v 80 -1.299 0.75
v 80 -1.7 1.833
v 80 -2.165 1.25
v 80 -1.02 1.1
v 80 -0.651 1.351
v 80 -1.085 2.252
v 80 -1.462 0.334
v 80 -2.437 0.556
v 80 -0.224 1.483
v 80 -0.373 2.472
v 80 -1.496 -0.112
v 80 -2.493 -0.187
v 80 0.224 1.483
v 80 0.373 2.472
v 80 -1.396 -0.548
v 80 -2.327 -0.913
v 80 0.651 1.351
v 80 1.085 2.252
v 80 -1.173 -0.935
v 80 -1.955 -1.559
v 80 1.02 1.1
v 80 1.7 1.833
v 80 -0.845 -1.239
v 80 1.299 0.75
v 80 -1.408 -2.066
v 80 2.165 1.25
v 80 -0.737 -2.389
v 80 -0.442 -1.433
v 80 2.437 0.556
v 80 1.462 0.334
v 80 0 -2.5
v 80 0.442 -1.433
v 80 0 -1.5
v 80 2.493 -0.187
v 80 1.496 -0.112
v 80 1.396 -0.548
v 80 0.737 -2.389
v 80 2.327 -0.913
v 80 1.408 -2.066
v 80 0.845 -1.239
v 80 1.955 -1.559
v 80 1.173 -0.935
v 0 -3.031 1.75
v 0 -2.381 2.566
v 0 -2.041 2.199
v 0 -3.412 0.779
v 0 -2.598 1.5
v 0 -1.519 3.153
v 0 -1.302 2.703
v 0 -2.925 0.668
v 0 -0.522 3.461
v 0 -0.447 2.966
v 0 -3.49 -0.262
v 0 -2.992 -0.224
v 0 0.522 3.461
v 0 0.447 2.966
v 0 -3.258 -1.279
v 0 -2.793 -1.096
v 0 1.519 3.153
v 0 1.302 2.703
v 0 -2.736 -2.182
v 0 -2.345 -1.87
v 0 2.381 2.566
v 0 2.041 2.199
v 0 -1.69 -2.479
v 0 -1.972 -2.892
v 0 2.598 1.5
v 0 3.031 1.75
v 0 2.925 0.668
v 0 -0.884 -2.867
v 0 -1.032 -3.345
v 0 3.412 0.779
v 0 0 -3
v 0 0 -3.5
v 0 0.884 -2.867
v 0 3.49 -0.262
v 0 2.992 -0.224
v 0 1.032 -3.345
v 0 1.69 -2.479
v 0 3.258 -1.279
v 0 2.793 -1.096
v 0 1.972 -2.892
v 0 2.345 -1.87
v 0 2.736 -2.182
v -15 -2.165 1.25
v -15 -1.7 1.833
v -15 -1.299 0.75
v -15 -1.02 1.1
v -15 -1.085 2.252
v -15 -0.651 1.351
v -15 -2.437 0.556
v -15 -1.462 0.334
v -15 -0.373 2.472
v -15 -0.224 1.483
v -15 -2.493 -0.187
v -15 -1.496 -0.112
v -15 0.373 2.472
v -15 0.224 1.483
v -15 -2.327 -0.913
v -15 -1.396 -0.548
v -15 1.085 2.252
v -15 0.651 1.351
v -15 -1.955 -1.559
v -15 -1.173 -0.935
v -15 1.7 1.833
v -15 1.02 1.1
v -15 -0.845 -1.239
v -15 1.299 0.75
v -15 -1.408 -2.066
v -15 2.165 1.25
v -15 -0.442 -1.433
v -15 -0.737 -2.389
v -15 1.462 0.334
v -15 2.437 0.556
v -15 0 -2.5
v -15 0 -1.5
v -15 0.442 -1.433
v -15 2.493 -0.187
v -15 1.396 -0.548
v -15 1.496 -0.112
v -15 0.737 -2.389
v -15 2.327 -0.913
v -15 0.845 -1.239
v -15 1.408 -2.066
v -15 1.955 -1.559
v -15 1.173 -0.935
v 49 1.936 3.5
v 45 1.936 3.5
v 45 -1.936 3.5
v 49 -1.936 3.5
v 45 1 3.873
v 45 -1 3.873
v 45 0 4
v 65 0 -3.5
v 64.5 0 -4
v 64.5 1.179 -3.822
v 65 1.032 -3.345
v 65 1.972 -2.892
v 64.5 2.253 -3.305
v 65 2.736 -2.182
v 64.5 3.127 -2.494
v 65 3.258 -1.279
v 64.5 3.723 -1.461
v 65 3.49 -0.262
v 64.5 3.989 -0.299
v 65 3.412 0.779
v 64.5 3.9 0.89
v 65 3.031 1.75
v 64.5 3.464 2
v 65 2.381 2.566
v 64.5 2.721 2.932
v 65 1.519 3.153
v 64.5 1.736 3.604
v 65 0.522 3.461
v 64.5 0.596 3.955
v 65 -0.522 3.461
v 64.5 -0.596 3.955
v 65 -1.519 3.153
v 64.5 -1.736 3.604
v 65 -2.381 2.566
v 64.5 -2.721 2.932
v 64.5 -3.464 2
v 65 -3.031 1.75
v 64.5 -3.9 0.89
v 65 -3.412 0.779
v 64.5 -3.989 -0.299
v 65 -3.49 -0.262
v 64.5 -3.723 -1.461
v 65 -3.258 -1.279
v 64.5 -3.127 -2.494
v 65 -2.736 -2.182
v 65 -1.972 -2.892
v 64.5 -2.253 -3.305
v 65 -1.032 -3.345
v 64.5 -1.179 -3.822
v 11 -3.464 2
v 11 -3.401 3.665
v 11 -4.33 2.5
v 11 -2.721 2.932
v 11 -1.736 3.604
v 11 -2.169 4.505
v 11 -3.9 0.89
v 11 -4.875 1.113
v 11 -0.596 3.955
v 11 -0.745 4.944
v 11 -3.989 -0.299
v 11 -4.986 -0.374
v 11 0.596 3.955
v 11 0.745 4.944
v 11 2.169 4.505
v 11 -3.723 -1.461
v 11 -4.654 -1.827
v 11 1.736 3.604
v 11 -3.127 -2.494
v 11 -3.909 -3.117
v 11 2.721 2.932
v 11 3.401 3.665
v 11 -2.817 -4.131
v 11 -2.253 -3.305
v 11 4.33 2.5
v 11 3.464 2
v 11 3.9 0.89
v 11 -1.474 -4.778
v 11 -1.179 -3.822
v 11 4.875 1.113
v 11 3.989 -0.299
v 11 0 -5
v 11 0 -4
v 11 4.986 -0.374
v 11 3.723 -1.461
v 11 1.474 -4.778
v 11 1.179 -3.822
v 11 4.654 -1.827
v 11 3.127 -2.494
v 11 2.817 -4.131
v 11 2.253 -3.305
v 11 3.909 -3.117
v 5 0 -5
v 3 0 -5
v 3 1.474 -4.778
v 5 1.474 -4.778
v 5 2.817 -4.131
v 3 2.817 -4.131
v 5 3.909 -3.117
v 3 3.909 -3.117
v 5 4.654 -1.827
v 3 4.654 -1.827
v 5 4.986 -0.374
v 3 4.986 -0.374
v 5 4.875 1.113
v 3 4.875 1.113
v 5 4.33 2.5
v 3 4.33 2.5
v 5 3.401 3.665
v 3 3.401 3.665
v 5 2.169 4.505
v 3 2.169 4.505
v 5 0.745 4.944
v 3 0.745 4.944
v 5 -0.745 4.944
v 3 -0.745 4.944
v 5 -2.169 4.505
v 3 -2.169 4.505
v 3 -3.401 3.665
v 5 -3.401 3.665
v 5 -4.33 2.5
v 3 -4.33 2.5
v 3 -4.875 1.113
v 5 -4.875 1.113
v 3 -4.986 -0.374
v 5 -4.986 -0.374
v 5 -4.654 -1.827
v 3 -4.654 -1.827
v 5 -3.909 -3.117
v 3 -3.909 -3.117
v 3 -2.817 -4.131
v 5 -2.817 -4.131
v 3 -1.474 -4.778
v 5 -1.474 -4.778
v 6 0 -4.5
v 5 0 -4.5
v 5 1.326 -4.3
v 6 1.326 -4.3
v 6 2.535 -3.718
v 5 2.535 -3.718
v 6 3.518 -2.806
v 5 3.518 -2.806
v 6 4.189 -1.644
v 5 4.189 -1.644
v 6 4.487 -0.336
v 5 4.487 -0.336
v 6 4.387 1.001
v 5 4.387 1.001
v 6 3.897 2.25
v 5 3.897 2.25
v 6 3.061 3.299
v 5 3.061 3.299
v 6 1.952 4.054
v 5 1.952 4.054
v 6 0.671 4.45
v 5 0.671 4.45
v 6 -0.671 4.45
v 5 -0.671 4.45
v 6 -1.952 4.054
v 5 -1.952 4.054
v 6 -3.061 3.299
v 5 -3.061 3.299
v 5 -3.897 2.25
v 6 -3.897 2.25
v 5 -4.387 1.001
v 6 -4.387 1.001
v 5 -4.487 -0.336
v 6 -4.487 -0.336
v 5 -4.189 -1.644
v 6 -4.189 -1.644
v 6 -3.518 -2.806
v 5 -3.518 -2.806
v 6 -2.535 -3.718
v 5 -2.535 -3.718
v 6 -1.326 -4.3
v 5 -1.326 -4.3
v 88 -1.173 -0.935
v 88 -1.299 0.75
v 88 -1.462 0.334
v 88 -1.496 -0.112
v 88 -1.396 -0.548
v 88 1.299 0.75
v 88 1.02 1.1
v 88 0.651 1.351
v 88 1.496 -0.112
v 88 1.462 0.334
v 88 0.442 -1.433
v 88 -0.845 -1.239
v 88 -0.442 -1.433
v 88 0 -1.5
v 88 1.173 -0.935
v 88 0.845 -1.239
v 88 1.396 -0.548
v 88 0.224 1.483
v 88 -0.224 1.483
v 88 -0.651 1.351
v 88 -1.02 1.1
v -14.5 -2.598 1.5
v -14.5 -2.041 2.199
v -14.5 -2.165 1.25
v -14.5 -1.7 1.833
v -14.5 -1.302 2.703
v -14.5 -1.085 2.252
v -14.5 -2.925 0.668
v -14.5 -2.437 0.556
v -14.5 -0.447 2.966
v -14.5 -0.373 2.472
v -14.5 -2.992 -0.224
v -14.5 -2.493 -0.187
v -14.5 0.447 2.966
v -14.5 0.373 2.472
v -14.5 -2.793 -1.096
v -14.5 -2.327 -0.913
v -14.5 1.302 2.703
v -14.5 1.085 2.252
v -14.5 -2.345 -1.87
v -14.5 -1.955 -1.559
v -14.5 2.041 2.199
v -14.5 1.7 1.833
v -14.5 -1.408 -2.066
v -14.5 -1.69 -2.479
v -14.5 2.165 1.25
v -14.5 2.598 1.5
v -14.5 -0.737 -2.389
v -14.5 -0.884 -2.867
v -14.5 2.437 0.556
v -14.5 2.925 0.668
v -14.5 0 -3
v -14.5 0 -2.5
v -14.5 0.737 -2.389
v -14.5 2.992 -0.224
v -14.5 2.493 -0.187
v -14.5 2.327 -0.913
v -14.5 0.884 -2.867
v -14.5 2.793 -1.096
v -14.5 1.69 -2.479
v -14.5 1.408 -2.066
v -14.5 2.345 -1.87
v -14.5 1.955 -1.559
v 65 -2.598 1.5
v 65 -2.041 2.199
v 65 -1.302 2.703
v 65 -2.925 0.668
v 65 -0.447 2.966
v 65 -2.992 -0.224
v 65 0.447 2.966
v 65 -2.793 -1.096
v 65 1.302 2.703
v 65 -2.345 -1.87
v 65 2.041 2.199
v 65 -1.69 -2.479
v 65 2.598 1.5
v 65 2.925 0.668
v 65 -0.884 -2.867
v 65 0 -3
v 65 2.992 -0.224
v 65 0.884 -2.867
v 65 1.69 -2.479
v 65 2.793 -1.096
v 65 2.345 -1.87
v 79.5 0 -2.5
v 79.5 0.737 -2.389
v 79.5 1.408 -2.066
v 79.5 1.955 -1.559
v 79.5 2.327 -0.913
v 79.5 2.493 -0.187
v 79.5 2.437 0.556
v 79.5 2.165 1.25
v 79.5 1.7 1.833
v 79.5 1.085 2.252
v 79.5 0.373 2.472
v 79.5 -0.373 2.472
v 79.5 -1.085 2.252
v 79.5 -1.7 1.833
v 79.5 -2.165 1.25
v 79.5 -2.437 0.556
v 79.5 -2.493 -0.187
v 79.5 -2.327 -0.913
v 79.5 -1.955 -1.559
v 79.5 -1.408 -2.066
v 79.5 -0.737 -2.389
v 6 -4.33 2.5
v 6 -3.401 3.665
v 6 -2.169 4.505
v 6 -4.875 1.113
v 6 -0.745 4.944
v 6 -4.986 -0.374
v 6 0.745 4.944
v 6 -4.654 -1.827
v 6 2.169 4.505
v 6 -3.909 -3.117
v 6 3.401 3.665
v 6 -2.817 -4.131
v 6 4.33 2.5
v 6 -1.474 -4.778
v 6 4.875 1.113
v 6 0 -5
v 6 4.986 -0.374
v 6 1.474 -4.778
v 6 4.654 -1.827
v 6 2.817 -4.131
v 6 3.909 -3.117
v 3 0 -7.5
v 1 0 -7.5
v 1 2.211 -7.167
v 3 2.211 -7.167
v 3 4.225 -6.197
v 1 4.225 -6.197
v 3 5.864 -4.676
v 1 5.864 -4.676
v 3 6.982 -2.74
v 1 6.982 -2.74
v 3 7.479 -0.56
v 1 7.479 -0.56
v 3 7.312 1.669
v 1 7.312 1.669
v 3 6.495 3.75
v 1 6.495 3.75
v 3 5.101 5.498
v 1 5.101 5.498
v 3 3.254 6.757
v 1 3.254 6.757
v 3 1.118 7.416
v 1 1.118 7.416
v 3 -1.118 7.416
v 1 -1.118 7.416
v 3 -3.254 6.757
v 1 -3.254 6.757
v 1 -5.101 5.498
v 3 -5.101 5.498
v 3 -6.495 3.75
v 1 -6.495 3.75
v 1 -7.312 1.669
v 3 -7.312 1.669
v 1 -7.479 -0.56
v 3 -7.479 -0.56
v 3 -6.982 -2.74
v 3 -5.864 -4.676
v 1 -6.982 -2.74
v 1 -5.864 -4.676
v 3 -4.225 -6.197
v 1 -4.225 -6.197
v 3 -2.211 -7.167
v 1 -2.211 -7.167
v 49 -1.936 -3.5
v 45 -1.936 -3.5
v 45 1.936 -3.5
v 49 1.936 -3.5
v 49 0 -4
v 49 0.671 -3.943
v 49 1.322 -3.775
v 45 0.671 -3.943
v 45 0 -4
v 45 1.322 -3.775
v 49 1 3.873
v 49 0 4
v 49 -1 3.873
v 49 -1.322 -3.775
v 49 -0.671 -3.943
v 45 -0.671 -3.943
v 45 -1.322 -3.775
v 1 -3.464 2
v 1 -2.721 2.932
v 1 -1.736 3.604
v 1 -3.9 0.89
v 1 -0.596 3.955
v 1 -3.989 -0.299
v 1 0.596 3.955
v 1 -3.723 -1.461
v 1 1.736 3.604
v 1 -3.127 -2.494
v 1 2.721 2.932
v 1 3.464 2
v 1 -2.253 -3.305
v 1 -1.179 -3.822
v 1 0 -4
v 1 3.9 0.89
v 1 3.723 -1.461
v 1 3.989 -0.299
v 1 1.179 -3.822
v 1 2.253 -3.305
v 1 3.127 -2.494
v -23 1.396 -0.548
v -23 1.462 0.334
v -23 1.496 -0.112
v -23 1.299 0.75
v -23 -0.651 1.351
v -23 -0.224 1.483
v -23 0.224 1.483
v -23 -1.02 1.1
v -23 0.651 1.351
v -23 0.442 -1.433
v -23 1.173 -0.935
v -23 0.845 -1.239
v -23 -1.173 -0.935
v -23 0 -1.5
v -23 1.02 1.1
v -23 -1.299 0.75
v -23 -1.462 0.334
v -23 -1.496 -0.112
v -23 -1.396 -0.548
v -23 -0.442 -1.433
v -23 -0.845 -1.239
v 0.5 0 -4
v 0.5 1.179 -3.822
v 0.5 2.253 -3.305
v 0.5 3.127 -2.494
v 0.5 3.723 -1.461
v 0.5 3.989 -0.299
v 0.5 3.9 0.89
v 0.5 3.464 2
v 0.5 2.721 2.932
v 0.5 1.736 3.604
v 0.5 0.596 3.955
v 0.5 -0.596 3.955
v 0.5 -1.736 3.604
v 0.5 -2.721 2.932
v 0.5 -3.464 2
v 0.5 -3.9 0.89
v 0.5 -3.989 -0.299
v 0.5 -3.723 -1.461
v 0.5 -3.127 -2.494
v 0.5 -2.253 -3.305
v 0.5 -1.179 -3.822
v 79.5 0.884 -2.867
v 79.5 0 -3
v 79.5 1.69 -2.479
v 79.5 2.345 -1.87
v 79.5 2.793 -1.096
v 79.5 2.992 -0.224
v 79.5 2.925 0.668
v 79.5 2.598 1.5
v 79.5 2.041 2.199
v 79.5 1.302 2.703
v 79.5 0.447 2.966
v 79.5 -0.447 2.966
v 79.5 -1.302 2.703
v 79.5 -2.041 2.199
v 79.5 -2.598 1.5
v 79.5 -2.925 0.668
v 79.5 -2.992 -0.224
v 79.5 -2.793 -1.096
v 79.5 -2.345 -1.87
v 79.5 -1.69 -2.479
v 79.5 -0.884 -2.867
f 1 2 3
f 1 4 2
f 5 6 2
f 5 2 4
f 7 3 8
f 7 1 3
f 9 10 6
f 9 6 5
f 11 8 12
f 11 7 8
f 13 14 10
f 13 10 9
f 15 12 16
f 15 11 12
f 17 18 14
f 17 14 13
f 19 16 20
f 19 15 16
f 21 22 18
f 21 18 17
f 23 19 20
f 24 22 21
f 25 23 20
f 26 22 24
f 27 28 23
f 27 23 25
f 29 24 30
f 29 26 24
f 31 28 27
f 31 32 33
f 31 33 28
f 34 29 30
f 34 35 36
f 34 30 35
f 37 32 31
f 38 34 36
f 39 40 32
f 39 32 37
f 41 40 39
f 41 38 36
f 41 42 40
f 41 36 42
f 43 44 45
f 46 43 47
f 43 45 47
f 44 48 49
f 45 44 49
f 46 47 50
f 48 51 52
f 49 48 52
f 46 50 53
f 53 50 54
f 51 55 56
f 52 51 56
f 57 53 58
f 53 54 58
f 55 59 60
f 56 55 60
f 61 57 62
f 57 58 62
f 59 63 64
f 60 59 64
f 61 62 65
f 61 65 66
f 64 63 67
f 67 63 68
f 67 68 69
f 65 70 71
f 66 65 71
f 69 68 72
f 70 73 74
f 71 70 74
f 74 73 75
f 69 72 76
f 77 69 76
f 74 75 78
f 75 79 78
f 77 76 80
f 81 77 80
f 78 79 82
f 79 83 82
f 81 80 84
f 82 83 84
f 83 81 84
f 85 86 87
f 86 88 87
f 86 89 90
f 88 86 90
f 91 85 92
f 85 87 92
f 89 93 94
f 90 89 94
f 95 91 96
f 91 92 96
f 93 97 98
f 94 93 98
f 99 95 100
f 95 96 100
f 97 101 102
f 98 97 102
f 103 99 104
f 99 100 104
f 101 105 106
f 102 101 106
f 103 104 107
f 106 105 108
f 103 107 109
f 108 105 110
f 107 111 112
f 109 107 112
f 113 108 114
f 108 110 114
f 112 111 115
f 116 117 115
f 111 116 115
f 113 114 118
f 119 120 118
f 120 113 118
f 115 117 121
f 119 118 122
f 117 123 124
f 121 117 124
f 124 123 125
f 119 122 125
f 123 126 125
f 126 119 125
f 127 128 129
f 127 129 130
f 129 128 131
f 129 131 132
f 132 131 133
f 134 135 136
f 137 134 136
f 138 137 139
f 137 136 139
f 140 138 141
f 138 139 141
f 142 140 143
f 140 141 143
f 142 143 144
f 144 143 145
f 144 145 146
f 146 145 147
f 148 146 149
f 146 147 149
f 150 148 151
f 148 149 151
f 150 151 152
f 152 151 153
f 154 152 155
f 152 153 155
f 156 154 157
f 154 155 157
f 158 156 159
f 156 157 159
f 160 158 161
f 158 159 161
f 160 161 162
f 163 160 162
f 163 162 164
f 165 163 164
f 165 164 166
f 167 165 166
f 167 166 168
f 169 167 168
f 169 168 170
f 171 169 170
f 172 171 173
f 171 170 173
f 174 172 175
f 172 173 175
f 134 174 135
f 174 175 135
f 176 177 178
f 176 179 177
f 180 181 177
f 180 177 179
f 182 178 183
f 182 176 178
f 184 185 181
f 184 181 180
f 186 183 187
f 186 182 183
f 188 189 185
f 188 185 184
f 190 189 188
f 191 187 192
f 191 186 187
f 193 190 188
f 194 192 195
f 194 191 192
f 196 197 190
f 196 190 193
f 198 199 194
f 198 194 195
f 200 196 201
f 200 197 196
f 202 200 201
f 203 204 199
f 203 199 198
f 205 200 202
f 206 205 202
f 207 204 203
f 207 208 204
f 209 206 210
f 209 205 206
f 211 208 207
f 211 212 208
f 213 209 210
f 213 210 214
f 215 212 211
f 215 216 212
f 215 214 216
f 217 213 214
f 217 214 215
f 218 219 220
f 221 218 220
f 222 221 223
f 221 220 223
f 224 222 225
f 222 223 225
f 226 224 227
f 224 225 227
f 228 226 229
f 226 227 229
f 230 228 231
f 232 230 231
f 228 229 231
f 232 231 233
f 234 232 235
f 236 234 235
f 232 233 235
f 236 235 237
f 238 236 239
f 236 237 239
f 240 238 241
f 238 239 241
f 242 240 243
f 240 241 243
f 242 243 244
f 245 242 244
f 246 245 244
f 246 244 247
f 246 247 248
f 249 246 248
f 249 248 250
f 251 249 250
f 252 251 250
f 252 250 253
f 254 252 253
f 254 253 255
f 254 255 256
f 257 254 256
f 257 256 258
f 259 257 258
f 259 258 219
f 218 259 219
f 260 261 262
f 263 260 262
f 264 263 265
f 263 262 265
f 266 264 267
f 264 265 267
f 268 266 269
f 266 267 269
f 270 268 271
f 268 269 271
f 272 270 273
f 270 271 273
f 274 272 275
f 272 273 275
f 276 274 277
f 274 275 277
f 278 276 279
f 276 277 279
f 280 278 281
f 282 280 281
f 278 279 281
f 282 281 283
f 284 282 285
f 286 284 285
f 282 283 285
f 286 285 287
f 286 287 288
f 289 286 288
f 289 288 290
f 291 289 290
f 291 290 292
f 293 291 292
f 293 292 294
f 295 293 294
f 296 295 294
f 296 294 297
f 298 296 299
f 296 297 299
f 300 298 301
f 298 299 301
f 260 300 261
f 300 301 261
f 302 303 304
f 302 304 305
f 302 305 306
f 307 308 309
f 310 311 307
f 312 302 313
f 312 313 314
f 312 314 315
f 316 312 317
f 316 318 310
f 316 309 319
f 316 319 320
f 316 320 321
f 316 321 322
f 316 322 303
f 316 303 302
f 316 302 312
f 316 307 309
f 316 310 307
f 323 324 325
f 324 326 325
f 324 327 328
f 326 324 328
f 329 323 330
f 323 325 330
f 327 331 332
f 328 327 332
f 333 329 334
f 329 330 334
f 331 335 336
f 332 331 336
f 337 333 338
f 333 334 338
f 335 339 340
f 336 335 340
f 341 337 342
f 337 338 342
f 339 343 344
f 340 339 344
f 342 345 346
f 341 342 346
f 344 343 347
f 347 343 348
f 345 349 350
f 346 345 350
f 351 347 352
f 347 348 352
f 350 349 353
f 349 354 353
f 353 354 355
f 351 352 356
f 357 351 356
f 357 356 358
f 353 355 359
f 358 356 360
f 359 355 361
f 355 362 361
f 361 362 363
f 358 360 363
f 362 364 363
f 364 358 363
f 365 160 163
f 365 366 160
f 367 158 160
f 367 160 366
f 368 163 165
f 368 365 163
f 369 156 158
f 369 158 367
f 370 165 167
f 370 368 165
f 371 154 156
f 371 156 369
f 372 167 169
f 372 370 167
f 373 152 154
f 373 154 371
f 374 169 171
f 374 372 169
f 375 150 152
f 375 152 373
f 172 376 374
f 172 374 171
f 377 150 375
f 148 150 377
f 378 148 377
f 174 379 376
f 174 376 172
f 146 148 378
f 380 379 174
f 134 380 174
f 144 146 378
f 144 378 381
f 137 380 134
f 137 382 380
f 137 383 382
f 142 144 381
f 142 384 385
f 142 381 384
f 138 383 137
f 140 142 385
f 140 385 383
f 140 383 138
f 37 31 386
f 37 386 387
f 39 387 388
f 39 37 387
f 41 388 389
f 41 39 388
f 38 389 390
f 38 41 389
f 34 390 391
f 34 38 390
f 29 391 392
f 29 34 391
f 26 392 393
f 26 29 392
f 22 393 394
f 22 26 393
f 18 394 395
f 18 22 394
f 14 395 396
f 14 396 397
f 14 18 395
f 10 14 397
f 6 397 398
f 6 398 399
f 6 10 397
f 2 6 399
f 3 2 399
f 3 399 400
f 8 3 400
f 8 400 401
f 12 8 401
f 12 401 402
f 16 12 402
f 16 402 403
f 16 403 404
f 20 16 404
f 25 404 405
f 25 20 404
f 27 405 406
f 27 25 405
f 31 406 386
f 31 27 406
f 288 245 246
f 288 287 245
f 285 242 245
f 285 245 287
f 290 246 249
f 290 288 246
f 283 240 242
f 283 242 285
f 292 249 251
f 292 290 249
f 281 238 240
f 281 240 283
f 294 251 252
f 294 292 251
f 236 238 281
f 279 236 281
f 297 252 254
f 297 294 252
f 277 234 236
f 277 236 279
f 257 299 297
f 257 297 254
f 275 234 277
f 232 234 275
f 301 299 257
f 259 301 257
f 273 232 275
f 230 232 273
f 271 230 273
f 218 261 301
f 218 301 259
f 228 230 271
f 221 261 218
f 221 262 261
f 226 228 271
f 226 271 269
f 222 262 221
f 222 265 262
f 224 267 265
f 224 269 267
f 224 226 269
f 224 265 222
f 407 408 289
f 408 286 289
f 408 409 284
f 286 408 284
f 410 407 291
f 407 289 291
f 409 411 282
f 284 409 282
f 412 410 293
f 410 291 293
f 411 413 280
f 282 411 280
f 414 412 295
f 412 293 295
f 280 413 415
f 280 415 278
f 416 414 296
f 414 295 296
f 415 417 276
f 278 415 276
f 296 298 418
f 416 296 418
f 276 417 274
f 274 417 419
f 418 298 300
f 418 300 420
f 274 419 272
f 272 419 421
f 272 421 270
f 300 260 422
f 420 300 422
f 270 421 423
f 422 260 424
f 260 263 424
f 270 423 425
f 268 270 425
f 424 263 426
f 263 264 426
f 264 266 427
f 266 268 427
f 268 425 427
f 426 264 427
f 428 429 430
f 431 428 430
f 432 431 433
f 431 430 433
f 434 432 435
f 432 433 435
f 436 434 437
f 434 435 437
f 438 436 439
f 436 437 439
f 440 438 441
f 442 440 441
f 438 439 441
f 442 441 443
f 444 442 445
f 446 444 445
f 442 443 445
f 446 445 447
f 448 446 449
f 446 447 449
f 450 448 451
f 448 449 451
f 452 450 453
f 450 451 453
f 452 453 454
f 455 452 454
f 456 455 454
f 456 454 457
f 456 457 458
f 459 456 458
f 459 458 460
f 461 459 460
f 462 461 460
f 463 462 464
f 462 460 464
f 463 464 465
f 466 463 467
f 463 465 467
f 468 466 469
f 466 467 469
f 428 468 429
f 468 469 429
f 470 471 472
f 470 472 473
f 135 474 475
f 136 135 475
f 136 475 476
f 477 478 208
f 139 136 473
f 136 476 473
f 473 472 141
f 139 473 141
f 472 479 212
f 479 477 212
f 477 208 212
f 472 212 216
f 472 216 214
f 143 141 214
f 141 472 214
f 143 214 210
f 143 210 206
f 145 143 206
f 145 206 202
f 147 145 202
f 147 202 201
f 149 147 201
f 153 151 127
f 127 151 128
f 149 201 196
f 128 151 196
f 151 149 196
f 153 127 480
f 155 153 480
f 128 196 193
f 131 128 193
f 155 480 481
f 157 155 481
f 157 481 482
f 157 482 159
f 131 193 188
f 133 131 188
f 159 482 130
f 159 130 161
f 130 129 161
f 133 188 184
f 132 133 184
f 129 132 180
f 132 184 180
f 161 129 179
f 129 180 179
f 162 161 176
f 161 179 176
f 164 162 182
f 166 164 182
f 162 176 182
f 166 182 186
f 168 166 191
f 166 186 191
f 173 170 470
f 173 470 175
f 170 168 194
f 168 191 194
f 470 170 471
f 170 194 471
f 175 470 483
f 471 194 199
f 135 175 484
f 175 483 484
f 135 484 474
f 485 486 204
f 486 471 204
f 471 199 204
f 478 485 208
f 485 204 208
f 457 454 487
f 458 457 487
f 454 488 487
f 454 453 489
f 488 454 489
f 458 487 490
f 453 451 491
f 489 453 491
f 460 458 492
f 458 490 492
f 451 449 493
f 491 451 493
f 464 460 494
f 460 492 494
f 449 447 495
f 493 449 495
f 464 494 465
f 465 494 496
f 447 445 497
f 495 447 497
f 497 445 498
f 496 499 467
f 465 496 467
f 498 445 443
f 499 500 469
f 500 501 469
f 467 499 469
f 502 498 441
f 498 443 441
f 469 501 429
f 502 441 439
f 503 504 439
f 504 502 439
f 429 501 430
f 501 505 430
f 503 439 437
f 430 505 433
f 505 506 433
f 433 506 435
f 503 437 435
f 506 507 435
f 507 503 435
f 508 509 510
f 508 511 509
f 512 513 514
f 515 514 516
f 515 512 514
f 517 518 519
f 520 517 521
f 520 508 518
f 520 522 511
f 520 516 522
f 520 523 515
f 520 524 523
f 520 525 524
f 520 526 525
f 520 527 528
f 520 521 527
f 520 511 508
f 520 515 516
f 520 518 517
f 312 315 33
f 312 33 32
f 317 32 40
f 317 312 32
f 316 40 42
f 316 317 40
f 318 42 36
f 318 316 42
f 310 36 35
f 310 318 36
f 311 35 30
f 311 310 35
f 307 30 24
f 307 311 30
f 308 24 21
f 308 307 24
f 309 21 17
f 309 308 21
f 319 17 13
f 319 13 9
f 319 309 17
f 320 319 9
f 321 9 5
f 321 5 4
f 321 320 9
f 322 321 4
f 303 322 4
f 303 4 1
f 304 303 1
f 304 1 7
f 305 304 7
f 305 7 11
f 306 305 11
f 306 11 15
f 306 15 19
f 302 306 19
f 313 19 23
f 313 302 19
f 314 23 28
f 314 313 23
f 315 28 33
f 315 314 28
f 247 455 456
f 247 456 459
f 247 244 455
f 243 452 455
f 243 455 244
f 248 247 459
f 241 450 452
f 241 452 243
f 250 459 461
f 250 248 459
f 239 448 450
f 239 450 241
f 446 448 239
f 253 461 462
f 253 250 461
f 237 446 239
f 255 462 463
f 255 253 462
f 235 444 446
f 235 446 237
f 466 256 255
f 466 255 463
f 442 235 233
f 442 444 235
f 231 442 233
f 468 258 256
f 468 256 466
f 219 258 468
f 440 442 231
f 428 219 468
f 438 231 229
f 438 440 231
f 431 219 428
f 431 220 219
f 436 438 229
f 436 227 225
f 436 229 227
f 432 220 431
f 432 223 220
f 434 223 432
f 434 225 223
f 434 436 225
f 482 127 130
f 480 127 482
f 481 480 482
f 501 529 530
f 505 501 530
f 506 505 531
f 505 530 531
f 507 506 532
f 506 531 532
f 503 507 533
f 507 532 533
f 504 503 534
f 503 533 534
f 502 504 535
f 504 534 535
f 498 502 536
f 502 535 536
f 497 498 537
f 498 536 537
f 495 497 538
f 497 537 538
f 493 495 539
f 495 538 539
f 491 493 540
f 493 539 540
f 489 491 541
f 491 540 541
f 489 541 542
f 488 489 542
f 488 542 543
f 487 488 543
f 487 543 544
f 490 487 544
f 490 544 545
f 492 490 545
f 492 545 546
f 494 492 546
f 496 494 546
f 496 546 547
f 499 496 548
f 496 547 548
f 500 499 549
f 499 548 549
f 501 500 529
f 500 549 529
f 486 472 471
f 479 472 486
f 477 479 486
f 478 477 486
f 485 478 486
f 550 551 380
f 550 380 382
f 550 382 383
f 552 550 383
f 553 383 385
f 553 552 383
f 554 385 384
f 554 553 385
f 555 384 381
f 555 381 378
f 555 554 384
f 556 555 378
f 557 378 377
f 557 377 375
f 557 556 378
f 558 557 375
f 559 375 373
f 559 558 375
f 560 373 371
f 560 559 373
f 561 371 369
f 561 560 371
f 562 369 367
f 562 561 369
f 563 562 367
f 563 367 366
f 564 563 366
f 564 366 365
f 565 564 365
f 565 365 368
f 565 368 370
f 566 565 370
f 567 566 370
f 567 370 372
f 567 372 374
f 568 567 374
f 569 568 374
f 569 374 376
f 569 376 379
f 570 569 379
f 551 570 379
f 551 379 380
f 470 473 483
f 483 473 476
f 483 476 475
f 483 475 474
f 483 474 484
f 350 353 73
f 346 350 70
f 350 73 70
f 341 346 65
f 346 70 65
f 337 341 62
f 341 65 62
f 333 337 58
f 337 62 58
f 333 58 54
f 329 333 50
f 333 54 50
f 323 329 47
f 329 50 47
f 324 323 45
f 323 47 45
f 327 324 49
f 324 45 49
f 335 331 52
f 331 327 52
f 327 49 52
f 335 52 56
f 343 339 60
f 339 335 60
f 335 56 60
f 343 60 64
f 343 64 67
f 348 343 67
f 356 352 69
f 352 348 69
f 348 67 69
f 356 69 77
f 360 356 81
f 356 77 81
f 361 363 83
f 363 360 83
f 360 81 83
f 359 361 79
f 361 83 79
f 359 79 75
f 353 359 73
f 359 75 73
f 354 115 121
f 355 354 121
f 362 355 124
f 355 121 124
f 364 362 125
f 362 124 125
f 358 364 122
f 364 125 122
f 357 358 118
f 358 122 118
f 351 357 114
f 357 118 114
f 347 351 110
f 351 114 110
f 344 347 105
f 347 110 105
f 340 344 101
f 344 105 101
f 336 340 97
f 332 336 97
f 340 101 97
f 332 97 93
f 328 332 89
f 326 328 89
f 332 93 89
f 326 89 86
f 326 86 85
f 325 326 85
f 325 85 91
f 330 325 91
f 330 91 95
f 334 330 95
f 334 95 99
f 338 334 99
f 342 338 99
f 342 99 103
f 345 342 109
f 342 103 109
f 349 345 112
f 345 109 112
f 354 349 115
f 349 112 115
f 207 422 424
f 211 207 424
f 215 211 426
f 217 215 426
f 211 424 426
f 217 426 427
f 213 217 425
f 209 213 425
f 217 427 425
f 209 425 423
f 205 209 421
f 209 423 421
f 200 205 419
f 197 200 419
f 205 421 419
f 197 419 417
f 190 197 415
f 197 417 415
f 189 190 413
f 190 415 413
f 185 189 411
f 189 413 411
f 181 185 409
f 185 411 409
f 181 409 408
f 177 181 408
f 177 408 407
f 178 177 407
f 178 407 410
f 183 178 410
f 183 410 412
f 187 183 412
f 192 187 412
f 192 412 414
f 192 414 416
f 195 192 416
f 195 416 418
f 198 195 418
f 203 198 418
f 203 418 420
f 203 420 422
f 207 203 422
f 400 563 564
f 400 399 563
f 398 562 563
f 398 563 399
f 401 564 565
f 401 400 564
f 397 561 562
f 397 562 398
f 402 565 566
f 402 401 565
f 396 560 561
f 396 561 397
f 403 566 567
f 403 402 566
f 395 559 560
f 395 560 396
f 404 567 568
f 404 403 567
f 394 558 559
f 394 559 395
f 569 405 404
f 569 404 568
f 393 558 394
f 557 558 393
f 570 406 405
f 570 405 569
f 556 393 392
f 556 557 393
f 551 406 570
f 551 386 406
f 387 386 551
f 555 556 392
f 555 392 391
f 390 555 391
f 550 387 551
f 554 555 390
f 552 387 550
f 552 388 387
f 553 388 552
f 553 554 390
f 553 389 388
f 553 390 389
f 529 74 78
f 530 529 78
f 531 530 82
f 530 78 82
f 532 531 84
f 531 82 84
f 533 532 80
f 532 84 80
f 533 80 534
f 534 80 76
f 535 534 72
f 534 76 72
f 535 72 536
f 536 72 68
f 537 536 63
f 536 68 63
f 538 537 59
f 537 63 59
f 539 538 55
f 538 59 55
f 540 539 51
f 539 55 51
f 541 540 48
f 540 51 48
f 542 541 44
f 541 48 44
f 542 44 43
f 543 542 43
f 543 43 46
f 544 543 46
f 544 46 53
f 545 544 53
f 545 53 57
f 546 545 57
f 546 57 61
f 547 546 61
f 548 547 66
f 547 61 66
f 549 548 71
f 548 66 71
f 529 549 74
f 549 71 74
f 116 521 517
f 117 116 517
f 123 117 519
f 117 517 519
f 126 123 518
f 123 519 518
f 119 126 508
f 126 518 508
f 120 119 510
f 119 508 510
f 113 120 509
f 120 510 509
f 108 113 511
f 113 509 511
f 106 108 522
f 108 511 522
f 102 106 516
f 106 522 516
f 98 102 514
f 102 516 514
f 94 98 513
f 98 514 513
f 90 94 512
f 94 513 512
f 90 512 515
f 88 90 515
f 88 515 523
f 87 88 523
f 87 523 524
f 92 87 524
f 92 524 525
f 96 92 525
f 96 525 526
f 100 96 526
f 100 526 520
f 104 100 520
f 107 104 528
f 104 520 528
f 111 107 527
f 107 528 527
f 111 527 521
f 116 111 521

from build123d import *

# Parameters (mm, degrees)
SKETCH_1_R          = 4
EXTRUDE_1_DEPTH     = 1
SKETCH_2_R          = 3
EXTRUDE_2_DEPTH     = 6
SKETCH_3_R          = 3
EXTRUDE_3_DEPTH     = 17
SKETCH_4_R          = 7.5
EXTRUDE_4_DEPTH     = 2
SKETCH_5_R          = 5
EXTRUDE_5_DEPTH     = 8
SKETCH_6_R          = 4
EXTRUDE_6_DEPTH     = 54
EXTRUDE_START       = 6
SKETCH_7_R          = 3
EXTRUDE_7_DEPTH     = 6
EXTRUDE_START_2     = 17
SKETCH_8_R          = 3
EXTRUDE_8_DEPTH     = 17
CHAMFER_1_SIZE      = 0.5
CHAMFER_2_SIZE      = 0.5
CUT_EXTRUDE_START   = 2
SKETCH_11_R         = 5
SKETCH_11_R_2       = 4.5
CUT_EXTRUDE_2_DEPTH = 1
SKETCH_12_W         = 4
SKETCH_12_H         = 0.5
CUT_EXTRUDE_3_DEPTH = 5
SKETCH_14_R         = 3
SKETCH_14_R_2       = 1.5
CUT_EXTRUDE_5_DEPTH = 8
SKETCH_15_R         = 3
SKETCH_15_R_2       = 2.5
CUT_EXTRUDE_6_DEPTH = 0.5


with BuildPart() as part:
    # 草图1 → 凸台-拉伸1 (new body)
    with BuildSketch(Plane(origin=(0, 0, 0), x_dir=(0, 0, -1), z_dir=(1, 0, 0))):
        Circle(SKETCH_1_R)
    extrude(amount=EXTRUDE_1_DEPTH)

    # 草图2 → 凸台-拉伸2 (add)
    with BuildSketch(Plane.ZY):
        with Locations(Location((0, 0, 0), (0, 0, 180))):
            Circle(SKETCH_2_R)
    extrude(amount=EXTRUDE_2_DEPTH)

    # 草图3 → 凸台-拉伸3 (add)
    with BuildSketch(Plane.ZY.offset(6)):
        with Locations(Location((0, 0, 0), (0, 0, 180))):
            Circle(SKETCH_3_R)
    extrude(amount=EXTRUDE_3_DEPTH)

    # 草图4 → 凸台-拉伸4 (add)
    with BuildSketch(Plane(origin=(1, 0, 0), x_dir=(0, 0, -1), z_dir=(1, 0, 0))):
        Circle(SKETCH_4_R)
    extrude(amount=EXTRUDE_4_DEPTH)

    # 草图5 → 凸台-拉伸5 (add)
    with BuildSketch(Plane(origin=(3, 0, 0), x_dir=(0, 0, -1), z_dir=(1, 0, 0))):
        Circle(SKETCH_5_R)
    extrude(amount=EXTRUDE_5_DEPTH)

    # 草图6 → 凸台-拉伸6 (add)
    with BuildSketch(Plane(origin=(11, 0, 0), x_dir=(0, 0, -1), z_dir=(1, 0, 0))):
        Circle(SKETCH_6_R)
    extrude(amount=EXTRUDE_6_DEPTH)

    # 草图7 → 凸台-拉伸7 (add)
    with BuildSketch(Plane(origin=(65, 0, 0), x_dir=(0, 0, -1), z_dir=(1, 0, 0)).offset(EXTRUDE_START)):
        Circle(SKETCH_7_R)
    extrude(amount=-EXTRUDE_7_DEPTH)

    # 草图8 → 凸台-拉伸8 (add)
    with BuildSketch(Plane(origin=(71, 0, 0), x_dir=(0, 0, -1), z_dir=(1, 0, 0)).offset(EXTRUDE_START_2)):
        Circle(SKETCH_8_R)
    extrude(amount=-EXTRUDE_8_DEPTH)

    # 倒角1
    chamfer_1_edges = [part.edges().sort_by_distance(p)[0] for p in [
        (65, 0, 4),
    ]]
    chamfer(chamfer_1_edges, length=CHAMFER_1_SIZE)

    # 倒角2
    chamfer_2_edges = [part.edges().sort_by_distance(p)[0] for p in [
        (0, 0, 4),
    ]]
    chamfer(chamfer_2_edges, length=CHAMFER_2_SIZE)

    # 草图11 → 切除-拉伸2 (cut)
    with BuildSketch(Plane(origin=(3, 0, 0), x_dir=(0, 0, -1), z_dir=(1, 0, 0)).offset(CUT_EXTRUDE_START)):
        Circle(SKETCH_11_R)
        Circle(SKETCH_11_R_2, mode=Mode.SUBTRACT)
    extrude(amount=CUT_EXTRUDE_2_DEPTH, mode=Mode.SUBTRACT)

    # 草图12 → 切除-拉伸3 (cut, symmetric)
    with BuildSketch(Plane(origin=(0, 0, 0), x_dir=(1, 0, 0), z_dir=(0, 1, 0))):
        with Locations((47, 3.75)):
            Rectangle(SKETCH_12_W, SKETCH_12_H)
        with Locations((47, -3.75)):
            Rectangle(SKETCH_12_W, SKETCH_12_H)
    extrude(amount=CUT_EXTRUDE_3_DEPTH, both=True, mode=Mode.SUBTRACT)

    # 草图14 → 切除-拉伸5 (cut)
    with BuildSketch(Plane(origin=(88, 0, 0), x_dir=(0, 0, -1), z_dir=(1, 0, 0))):
        Circle(SKETCH_14_R)
        Circle(SKETCH_14_R_2, mode=Mode.SUBTRACT)
    cut_extrude_5 = extrude(amount=-CUT_EXTRUDE_5_DEPTH, mode=Mode.SUBTRACT)

    # 草图15 → 切除-拉伸6 (cut)
    with BuildSketch(Plane(origin=(80, 0, 0), x_dir=(0, 0, -1), z_dir=(1, 0, 0))):
        Circle(SKETCH_15_R)
        Circle(SKETCH_15_R_2, mode=Mode.SUBTRACT)
    cut_extrude_6 = extrude(amount=-CUT_EXTRUDE_6_DEPTH, mode=Mode.SUBTRACT)

    # 镜向2: 切除-拉伸5, 切除-拉伸6 across plane
    add(cut_extrude_5.mirror(Plane(origin=(32.5, 0, 0), x_dir=(0, 0, 1), z_dir=(1, 0, 0))), mode=Mode.SUBTRACT)
    add(cut_extrude_6.mirror(Plane(origin=(32.5, 0, 0), x_dir=(0, 0, 1), z_dir=(1, 0, 0))), mode=Mode.SUBTRACT)


solid = part.part
